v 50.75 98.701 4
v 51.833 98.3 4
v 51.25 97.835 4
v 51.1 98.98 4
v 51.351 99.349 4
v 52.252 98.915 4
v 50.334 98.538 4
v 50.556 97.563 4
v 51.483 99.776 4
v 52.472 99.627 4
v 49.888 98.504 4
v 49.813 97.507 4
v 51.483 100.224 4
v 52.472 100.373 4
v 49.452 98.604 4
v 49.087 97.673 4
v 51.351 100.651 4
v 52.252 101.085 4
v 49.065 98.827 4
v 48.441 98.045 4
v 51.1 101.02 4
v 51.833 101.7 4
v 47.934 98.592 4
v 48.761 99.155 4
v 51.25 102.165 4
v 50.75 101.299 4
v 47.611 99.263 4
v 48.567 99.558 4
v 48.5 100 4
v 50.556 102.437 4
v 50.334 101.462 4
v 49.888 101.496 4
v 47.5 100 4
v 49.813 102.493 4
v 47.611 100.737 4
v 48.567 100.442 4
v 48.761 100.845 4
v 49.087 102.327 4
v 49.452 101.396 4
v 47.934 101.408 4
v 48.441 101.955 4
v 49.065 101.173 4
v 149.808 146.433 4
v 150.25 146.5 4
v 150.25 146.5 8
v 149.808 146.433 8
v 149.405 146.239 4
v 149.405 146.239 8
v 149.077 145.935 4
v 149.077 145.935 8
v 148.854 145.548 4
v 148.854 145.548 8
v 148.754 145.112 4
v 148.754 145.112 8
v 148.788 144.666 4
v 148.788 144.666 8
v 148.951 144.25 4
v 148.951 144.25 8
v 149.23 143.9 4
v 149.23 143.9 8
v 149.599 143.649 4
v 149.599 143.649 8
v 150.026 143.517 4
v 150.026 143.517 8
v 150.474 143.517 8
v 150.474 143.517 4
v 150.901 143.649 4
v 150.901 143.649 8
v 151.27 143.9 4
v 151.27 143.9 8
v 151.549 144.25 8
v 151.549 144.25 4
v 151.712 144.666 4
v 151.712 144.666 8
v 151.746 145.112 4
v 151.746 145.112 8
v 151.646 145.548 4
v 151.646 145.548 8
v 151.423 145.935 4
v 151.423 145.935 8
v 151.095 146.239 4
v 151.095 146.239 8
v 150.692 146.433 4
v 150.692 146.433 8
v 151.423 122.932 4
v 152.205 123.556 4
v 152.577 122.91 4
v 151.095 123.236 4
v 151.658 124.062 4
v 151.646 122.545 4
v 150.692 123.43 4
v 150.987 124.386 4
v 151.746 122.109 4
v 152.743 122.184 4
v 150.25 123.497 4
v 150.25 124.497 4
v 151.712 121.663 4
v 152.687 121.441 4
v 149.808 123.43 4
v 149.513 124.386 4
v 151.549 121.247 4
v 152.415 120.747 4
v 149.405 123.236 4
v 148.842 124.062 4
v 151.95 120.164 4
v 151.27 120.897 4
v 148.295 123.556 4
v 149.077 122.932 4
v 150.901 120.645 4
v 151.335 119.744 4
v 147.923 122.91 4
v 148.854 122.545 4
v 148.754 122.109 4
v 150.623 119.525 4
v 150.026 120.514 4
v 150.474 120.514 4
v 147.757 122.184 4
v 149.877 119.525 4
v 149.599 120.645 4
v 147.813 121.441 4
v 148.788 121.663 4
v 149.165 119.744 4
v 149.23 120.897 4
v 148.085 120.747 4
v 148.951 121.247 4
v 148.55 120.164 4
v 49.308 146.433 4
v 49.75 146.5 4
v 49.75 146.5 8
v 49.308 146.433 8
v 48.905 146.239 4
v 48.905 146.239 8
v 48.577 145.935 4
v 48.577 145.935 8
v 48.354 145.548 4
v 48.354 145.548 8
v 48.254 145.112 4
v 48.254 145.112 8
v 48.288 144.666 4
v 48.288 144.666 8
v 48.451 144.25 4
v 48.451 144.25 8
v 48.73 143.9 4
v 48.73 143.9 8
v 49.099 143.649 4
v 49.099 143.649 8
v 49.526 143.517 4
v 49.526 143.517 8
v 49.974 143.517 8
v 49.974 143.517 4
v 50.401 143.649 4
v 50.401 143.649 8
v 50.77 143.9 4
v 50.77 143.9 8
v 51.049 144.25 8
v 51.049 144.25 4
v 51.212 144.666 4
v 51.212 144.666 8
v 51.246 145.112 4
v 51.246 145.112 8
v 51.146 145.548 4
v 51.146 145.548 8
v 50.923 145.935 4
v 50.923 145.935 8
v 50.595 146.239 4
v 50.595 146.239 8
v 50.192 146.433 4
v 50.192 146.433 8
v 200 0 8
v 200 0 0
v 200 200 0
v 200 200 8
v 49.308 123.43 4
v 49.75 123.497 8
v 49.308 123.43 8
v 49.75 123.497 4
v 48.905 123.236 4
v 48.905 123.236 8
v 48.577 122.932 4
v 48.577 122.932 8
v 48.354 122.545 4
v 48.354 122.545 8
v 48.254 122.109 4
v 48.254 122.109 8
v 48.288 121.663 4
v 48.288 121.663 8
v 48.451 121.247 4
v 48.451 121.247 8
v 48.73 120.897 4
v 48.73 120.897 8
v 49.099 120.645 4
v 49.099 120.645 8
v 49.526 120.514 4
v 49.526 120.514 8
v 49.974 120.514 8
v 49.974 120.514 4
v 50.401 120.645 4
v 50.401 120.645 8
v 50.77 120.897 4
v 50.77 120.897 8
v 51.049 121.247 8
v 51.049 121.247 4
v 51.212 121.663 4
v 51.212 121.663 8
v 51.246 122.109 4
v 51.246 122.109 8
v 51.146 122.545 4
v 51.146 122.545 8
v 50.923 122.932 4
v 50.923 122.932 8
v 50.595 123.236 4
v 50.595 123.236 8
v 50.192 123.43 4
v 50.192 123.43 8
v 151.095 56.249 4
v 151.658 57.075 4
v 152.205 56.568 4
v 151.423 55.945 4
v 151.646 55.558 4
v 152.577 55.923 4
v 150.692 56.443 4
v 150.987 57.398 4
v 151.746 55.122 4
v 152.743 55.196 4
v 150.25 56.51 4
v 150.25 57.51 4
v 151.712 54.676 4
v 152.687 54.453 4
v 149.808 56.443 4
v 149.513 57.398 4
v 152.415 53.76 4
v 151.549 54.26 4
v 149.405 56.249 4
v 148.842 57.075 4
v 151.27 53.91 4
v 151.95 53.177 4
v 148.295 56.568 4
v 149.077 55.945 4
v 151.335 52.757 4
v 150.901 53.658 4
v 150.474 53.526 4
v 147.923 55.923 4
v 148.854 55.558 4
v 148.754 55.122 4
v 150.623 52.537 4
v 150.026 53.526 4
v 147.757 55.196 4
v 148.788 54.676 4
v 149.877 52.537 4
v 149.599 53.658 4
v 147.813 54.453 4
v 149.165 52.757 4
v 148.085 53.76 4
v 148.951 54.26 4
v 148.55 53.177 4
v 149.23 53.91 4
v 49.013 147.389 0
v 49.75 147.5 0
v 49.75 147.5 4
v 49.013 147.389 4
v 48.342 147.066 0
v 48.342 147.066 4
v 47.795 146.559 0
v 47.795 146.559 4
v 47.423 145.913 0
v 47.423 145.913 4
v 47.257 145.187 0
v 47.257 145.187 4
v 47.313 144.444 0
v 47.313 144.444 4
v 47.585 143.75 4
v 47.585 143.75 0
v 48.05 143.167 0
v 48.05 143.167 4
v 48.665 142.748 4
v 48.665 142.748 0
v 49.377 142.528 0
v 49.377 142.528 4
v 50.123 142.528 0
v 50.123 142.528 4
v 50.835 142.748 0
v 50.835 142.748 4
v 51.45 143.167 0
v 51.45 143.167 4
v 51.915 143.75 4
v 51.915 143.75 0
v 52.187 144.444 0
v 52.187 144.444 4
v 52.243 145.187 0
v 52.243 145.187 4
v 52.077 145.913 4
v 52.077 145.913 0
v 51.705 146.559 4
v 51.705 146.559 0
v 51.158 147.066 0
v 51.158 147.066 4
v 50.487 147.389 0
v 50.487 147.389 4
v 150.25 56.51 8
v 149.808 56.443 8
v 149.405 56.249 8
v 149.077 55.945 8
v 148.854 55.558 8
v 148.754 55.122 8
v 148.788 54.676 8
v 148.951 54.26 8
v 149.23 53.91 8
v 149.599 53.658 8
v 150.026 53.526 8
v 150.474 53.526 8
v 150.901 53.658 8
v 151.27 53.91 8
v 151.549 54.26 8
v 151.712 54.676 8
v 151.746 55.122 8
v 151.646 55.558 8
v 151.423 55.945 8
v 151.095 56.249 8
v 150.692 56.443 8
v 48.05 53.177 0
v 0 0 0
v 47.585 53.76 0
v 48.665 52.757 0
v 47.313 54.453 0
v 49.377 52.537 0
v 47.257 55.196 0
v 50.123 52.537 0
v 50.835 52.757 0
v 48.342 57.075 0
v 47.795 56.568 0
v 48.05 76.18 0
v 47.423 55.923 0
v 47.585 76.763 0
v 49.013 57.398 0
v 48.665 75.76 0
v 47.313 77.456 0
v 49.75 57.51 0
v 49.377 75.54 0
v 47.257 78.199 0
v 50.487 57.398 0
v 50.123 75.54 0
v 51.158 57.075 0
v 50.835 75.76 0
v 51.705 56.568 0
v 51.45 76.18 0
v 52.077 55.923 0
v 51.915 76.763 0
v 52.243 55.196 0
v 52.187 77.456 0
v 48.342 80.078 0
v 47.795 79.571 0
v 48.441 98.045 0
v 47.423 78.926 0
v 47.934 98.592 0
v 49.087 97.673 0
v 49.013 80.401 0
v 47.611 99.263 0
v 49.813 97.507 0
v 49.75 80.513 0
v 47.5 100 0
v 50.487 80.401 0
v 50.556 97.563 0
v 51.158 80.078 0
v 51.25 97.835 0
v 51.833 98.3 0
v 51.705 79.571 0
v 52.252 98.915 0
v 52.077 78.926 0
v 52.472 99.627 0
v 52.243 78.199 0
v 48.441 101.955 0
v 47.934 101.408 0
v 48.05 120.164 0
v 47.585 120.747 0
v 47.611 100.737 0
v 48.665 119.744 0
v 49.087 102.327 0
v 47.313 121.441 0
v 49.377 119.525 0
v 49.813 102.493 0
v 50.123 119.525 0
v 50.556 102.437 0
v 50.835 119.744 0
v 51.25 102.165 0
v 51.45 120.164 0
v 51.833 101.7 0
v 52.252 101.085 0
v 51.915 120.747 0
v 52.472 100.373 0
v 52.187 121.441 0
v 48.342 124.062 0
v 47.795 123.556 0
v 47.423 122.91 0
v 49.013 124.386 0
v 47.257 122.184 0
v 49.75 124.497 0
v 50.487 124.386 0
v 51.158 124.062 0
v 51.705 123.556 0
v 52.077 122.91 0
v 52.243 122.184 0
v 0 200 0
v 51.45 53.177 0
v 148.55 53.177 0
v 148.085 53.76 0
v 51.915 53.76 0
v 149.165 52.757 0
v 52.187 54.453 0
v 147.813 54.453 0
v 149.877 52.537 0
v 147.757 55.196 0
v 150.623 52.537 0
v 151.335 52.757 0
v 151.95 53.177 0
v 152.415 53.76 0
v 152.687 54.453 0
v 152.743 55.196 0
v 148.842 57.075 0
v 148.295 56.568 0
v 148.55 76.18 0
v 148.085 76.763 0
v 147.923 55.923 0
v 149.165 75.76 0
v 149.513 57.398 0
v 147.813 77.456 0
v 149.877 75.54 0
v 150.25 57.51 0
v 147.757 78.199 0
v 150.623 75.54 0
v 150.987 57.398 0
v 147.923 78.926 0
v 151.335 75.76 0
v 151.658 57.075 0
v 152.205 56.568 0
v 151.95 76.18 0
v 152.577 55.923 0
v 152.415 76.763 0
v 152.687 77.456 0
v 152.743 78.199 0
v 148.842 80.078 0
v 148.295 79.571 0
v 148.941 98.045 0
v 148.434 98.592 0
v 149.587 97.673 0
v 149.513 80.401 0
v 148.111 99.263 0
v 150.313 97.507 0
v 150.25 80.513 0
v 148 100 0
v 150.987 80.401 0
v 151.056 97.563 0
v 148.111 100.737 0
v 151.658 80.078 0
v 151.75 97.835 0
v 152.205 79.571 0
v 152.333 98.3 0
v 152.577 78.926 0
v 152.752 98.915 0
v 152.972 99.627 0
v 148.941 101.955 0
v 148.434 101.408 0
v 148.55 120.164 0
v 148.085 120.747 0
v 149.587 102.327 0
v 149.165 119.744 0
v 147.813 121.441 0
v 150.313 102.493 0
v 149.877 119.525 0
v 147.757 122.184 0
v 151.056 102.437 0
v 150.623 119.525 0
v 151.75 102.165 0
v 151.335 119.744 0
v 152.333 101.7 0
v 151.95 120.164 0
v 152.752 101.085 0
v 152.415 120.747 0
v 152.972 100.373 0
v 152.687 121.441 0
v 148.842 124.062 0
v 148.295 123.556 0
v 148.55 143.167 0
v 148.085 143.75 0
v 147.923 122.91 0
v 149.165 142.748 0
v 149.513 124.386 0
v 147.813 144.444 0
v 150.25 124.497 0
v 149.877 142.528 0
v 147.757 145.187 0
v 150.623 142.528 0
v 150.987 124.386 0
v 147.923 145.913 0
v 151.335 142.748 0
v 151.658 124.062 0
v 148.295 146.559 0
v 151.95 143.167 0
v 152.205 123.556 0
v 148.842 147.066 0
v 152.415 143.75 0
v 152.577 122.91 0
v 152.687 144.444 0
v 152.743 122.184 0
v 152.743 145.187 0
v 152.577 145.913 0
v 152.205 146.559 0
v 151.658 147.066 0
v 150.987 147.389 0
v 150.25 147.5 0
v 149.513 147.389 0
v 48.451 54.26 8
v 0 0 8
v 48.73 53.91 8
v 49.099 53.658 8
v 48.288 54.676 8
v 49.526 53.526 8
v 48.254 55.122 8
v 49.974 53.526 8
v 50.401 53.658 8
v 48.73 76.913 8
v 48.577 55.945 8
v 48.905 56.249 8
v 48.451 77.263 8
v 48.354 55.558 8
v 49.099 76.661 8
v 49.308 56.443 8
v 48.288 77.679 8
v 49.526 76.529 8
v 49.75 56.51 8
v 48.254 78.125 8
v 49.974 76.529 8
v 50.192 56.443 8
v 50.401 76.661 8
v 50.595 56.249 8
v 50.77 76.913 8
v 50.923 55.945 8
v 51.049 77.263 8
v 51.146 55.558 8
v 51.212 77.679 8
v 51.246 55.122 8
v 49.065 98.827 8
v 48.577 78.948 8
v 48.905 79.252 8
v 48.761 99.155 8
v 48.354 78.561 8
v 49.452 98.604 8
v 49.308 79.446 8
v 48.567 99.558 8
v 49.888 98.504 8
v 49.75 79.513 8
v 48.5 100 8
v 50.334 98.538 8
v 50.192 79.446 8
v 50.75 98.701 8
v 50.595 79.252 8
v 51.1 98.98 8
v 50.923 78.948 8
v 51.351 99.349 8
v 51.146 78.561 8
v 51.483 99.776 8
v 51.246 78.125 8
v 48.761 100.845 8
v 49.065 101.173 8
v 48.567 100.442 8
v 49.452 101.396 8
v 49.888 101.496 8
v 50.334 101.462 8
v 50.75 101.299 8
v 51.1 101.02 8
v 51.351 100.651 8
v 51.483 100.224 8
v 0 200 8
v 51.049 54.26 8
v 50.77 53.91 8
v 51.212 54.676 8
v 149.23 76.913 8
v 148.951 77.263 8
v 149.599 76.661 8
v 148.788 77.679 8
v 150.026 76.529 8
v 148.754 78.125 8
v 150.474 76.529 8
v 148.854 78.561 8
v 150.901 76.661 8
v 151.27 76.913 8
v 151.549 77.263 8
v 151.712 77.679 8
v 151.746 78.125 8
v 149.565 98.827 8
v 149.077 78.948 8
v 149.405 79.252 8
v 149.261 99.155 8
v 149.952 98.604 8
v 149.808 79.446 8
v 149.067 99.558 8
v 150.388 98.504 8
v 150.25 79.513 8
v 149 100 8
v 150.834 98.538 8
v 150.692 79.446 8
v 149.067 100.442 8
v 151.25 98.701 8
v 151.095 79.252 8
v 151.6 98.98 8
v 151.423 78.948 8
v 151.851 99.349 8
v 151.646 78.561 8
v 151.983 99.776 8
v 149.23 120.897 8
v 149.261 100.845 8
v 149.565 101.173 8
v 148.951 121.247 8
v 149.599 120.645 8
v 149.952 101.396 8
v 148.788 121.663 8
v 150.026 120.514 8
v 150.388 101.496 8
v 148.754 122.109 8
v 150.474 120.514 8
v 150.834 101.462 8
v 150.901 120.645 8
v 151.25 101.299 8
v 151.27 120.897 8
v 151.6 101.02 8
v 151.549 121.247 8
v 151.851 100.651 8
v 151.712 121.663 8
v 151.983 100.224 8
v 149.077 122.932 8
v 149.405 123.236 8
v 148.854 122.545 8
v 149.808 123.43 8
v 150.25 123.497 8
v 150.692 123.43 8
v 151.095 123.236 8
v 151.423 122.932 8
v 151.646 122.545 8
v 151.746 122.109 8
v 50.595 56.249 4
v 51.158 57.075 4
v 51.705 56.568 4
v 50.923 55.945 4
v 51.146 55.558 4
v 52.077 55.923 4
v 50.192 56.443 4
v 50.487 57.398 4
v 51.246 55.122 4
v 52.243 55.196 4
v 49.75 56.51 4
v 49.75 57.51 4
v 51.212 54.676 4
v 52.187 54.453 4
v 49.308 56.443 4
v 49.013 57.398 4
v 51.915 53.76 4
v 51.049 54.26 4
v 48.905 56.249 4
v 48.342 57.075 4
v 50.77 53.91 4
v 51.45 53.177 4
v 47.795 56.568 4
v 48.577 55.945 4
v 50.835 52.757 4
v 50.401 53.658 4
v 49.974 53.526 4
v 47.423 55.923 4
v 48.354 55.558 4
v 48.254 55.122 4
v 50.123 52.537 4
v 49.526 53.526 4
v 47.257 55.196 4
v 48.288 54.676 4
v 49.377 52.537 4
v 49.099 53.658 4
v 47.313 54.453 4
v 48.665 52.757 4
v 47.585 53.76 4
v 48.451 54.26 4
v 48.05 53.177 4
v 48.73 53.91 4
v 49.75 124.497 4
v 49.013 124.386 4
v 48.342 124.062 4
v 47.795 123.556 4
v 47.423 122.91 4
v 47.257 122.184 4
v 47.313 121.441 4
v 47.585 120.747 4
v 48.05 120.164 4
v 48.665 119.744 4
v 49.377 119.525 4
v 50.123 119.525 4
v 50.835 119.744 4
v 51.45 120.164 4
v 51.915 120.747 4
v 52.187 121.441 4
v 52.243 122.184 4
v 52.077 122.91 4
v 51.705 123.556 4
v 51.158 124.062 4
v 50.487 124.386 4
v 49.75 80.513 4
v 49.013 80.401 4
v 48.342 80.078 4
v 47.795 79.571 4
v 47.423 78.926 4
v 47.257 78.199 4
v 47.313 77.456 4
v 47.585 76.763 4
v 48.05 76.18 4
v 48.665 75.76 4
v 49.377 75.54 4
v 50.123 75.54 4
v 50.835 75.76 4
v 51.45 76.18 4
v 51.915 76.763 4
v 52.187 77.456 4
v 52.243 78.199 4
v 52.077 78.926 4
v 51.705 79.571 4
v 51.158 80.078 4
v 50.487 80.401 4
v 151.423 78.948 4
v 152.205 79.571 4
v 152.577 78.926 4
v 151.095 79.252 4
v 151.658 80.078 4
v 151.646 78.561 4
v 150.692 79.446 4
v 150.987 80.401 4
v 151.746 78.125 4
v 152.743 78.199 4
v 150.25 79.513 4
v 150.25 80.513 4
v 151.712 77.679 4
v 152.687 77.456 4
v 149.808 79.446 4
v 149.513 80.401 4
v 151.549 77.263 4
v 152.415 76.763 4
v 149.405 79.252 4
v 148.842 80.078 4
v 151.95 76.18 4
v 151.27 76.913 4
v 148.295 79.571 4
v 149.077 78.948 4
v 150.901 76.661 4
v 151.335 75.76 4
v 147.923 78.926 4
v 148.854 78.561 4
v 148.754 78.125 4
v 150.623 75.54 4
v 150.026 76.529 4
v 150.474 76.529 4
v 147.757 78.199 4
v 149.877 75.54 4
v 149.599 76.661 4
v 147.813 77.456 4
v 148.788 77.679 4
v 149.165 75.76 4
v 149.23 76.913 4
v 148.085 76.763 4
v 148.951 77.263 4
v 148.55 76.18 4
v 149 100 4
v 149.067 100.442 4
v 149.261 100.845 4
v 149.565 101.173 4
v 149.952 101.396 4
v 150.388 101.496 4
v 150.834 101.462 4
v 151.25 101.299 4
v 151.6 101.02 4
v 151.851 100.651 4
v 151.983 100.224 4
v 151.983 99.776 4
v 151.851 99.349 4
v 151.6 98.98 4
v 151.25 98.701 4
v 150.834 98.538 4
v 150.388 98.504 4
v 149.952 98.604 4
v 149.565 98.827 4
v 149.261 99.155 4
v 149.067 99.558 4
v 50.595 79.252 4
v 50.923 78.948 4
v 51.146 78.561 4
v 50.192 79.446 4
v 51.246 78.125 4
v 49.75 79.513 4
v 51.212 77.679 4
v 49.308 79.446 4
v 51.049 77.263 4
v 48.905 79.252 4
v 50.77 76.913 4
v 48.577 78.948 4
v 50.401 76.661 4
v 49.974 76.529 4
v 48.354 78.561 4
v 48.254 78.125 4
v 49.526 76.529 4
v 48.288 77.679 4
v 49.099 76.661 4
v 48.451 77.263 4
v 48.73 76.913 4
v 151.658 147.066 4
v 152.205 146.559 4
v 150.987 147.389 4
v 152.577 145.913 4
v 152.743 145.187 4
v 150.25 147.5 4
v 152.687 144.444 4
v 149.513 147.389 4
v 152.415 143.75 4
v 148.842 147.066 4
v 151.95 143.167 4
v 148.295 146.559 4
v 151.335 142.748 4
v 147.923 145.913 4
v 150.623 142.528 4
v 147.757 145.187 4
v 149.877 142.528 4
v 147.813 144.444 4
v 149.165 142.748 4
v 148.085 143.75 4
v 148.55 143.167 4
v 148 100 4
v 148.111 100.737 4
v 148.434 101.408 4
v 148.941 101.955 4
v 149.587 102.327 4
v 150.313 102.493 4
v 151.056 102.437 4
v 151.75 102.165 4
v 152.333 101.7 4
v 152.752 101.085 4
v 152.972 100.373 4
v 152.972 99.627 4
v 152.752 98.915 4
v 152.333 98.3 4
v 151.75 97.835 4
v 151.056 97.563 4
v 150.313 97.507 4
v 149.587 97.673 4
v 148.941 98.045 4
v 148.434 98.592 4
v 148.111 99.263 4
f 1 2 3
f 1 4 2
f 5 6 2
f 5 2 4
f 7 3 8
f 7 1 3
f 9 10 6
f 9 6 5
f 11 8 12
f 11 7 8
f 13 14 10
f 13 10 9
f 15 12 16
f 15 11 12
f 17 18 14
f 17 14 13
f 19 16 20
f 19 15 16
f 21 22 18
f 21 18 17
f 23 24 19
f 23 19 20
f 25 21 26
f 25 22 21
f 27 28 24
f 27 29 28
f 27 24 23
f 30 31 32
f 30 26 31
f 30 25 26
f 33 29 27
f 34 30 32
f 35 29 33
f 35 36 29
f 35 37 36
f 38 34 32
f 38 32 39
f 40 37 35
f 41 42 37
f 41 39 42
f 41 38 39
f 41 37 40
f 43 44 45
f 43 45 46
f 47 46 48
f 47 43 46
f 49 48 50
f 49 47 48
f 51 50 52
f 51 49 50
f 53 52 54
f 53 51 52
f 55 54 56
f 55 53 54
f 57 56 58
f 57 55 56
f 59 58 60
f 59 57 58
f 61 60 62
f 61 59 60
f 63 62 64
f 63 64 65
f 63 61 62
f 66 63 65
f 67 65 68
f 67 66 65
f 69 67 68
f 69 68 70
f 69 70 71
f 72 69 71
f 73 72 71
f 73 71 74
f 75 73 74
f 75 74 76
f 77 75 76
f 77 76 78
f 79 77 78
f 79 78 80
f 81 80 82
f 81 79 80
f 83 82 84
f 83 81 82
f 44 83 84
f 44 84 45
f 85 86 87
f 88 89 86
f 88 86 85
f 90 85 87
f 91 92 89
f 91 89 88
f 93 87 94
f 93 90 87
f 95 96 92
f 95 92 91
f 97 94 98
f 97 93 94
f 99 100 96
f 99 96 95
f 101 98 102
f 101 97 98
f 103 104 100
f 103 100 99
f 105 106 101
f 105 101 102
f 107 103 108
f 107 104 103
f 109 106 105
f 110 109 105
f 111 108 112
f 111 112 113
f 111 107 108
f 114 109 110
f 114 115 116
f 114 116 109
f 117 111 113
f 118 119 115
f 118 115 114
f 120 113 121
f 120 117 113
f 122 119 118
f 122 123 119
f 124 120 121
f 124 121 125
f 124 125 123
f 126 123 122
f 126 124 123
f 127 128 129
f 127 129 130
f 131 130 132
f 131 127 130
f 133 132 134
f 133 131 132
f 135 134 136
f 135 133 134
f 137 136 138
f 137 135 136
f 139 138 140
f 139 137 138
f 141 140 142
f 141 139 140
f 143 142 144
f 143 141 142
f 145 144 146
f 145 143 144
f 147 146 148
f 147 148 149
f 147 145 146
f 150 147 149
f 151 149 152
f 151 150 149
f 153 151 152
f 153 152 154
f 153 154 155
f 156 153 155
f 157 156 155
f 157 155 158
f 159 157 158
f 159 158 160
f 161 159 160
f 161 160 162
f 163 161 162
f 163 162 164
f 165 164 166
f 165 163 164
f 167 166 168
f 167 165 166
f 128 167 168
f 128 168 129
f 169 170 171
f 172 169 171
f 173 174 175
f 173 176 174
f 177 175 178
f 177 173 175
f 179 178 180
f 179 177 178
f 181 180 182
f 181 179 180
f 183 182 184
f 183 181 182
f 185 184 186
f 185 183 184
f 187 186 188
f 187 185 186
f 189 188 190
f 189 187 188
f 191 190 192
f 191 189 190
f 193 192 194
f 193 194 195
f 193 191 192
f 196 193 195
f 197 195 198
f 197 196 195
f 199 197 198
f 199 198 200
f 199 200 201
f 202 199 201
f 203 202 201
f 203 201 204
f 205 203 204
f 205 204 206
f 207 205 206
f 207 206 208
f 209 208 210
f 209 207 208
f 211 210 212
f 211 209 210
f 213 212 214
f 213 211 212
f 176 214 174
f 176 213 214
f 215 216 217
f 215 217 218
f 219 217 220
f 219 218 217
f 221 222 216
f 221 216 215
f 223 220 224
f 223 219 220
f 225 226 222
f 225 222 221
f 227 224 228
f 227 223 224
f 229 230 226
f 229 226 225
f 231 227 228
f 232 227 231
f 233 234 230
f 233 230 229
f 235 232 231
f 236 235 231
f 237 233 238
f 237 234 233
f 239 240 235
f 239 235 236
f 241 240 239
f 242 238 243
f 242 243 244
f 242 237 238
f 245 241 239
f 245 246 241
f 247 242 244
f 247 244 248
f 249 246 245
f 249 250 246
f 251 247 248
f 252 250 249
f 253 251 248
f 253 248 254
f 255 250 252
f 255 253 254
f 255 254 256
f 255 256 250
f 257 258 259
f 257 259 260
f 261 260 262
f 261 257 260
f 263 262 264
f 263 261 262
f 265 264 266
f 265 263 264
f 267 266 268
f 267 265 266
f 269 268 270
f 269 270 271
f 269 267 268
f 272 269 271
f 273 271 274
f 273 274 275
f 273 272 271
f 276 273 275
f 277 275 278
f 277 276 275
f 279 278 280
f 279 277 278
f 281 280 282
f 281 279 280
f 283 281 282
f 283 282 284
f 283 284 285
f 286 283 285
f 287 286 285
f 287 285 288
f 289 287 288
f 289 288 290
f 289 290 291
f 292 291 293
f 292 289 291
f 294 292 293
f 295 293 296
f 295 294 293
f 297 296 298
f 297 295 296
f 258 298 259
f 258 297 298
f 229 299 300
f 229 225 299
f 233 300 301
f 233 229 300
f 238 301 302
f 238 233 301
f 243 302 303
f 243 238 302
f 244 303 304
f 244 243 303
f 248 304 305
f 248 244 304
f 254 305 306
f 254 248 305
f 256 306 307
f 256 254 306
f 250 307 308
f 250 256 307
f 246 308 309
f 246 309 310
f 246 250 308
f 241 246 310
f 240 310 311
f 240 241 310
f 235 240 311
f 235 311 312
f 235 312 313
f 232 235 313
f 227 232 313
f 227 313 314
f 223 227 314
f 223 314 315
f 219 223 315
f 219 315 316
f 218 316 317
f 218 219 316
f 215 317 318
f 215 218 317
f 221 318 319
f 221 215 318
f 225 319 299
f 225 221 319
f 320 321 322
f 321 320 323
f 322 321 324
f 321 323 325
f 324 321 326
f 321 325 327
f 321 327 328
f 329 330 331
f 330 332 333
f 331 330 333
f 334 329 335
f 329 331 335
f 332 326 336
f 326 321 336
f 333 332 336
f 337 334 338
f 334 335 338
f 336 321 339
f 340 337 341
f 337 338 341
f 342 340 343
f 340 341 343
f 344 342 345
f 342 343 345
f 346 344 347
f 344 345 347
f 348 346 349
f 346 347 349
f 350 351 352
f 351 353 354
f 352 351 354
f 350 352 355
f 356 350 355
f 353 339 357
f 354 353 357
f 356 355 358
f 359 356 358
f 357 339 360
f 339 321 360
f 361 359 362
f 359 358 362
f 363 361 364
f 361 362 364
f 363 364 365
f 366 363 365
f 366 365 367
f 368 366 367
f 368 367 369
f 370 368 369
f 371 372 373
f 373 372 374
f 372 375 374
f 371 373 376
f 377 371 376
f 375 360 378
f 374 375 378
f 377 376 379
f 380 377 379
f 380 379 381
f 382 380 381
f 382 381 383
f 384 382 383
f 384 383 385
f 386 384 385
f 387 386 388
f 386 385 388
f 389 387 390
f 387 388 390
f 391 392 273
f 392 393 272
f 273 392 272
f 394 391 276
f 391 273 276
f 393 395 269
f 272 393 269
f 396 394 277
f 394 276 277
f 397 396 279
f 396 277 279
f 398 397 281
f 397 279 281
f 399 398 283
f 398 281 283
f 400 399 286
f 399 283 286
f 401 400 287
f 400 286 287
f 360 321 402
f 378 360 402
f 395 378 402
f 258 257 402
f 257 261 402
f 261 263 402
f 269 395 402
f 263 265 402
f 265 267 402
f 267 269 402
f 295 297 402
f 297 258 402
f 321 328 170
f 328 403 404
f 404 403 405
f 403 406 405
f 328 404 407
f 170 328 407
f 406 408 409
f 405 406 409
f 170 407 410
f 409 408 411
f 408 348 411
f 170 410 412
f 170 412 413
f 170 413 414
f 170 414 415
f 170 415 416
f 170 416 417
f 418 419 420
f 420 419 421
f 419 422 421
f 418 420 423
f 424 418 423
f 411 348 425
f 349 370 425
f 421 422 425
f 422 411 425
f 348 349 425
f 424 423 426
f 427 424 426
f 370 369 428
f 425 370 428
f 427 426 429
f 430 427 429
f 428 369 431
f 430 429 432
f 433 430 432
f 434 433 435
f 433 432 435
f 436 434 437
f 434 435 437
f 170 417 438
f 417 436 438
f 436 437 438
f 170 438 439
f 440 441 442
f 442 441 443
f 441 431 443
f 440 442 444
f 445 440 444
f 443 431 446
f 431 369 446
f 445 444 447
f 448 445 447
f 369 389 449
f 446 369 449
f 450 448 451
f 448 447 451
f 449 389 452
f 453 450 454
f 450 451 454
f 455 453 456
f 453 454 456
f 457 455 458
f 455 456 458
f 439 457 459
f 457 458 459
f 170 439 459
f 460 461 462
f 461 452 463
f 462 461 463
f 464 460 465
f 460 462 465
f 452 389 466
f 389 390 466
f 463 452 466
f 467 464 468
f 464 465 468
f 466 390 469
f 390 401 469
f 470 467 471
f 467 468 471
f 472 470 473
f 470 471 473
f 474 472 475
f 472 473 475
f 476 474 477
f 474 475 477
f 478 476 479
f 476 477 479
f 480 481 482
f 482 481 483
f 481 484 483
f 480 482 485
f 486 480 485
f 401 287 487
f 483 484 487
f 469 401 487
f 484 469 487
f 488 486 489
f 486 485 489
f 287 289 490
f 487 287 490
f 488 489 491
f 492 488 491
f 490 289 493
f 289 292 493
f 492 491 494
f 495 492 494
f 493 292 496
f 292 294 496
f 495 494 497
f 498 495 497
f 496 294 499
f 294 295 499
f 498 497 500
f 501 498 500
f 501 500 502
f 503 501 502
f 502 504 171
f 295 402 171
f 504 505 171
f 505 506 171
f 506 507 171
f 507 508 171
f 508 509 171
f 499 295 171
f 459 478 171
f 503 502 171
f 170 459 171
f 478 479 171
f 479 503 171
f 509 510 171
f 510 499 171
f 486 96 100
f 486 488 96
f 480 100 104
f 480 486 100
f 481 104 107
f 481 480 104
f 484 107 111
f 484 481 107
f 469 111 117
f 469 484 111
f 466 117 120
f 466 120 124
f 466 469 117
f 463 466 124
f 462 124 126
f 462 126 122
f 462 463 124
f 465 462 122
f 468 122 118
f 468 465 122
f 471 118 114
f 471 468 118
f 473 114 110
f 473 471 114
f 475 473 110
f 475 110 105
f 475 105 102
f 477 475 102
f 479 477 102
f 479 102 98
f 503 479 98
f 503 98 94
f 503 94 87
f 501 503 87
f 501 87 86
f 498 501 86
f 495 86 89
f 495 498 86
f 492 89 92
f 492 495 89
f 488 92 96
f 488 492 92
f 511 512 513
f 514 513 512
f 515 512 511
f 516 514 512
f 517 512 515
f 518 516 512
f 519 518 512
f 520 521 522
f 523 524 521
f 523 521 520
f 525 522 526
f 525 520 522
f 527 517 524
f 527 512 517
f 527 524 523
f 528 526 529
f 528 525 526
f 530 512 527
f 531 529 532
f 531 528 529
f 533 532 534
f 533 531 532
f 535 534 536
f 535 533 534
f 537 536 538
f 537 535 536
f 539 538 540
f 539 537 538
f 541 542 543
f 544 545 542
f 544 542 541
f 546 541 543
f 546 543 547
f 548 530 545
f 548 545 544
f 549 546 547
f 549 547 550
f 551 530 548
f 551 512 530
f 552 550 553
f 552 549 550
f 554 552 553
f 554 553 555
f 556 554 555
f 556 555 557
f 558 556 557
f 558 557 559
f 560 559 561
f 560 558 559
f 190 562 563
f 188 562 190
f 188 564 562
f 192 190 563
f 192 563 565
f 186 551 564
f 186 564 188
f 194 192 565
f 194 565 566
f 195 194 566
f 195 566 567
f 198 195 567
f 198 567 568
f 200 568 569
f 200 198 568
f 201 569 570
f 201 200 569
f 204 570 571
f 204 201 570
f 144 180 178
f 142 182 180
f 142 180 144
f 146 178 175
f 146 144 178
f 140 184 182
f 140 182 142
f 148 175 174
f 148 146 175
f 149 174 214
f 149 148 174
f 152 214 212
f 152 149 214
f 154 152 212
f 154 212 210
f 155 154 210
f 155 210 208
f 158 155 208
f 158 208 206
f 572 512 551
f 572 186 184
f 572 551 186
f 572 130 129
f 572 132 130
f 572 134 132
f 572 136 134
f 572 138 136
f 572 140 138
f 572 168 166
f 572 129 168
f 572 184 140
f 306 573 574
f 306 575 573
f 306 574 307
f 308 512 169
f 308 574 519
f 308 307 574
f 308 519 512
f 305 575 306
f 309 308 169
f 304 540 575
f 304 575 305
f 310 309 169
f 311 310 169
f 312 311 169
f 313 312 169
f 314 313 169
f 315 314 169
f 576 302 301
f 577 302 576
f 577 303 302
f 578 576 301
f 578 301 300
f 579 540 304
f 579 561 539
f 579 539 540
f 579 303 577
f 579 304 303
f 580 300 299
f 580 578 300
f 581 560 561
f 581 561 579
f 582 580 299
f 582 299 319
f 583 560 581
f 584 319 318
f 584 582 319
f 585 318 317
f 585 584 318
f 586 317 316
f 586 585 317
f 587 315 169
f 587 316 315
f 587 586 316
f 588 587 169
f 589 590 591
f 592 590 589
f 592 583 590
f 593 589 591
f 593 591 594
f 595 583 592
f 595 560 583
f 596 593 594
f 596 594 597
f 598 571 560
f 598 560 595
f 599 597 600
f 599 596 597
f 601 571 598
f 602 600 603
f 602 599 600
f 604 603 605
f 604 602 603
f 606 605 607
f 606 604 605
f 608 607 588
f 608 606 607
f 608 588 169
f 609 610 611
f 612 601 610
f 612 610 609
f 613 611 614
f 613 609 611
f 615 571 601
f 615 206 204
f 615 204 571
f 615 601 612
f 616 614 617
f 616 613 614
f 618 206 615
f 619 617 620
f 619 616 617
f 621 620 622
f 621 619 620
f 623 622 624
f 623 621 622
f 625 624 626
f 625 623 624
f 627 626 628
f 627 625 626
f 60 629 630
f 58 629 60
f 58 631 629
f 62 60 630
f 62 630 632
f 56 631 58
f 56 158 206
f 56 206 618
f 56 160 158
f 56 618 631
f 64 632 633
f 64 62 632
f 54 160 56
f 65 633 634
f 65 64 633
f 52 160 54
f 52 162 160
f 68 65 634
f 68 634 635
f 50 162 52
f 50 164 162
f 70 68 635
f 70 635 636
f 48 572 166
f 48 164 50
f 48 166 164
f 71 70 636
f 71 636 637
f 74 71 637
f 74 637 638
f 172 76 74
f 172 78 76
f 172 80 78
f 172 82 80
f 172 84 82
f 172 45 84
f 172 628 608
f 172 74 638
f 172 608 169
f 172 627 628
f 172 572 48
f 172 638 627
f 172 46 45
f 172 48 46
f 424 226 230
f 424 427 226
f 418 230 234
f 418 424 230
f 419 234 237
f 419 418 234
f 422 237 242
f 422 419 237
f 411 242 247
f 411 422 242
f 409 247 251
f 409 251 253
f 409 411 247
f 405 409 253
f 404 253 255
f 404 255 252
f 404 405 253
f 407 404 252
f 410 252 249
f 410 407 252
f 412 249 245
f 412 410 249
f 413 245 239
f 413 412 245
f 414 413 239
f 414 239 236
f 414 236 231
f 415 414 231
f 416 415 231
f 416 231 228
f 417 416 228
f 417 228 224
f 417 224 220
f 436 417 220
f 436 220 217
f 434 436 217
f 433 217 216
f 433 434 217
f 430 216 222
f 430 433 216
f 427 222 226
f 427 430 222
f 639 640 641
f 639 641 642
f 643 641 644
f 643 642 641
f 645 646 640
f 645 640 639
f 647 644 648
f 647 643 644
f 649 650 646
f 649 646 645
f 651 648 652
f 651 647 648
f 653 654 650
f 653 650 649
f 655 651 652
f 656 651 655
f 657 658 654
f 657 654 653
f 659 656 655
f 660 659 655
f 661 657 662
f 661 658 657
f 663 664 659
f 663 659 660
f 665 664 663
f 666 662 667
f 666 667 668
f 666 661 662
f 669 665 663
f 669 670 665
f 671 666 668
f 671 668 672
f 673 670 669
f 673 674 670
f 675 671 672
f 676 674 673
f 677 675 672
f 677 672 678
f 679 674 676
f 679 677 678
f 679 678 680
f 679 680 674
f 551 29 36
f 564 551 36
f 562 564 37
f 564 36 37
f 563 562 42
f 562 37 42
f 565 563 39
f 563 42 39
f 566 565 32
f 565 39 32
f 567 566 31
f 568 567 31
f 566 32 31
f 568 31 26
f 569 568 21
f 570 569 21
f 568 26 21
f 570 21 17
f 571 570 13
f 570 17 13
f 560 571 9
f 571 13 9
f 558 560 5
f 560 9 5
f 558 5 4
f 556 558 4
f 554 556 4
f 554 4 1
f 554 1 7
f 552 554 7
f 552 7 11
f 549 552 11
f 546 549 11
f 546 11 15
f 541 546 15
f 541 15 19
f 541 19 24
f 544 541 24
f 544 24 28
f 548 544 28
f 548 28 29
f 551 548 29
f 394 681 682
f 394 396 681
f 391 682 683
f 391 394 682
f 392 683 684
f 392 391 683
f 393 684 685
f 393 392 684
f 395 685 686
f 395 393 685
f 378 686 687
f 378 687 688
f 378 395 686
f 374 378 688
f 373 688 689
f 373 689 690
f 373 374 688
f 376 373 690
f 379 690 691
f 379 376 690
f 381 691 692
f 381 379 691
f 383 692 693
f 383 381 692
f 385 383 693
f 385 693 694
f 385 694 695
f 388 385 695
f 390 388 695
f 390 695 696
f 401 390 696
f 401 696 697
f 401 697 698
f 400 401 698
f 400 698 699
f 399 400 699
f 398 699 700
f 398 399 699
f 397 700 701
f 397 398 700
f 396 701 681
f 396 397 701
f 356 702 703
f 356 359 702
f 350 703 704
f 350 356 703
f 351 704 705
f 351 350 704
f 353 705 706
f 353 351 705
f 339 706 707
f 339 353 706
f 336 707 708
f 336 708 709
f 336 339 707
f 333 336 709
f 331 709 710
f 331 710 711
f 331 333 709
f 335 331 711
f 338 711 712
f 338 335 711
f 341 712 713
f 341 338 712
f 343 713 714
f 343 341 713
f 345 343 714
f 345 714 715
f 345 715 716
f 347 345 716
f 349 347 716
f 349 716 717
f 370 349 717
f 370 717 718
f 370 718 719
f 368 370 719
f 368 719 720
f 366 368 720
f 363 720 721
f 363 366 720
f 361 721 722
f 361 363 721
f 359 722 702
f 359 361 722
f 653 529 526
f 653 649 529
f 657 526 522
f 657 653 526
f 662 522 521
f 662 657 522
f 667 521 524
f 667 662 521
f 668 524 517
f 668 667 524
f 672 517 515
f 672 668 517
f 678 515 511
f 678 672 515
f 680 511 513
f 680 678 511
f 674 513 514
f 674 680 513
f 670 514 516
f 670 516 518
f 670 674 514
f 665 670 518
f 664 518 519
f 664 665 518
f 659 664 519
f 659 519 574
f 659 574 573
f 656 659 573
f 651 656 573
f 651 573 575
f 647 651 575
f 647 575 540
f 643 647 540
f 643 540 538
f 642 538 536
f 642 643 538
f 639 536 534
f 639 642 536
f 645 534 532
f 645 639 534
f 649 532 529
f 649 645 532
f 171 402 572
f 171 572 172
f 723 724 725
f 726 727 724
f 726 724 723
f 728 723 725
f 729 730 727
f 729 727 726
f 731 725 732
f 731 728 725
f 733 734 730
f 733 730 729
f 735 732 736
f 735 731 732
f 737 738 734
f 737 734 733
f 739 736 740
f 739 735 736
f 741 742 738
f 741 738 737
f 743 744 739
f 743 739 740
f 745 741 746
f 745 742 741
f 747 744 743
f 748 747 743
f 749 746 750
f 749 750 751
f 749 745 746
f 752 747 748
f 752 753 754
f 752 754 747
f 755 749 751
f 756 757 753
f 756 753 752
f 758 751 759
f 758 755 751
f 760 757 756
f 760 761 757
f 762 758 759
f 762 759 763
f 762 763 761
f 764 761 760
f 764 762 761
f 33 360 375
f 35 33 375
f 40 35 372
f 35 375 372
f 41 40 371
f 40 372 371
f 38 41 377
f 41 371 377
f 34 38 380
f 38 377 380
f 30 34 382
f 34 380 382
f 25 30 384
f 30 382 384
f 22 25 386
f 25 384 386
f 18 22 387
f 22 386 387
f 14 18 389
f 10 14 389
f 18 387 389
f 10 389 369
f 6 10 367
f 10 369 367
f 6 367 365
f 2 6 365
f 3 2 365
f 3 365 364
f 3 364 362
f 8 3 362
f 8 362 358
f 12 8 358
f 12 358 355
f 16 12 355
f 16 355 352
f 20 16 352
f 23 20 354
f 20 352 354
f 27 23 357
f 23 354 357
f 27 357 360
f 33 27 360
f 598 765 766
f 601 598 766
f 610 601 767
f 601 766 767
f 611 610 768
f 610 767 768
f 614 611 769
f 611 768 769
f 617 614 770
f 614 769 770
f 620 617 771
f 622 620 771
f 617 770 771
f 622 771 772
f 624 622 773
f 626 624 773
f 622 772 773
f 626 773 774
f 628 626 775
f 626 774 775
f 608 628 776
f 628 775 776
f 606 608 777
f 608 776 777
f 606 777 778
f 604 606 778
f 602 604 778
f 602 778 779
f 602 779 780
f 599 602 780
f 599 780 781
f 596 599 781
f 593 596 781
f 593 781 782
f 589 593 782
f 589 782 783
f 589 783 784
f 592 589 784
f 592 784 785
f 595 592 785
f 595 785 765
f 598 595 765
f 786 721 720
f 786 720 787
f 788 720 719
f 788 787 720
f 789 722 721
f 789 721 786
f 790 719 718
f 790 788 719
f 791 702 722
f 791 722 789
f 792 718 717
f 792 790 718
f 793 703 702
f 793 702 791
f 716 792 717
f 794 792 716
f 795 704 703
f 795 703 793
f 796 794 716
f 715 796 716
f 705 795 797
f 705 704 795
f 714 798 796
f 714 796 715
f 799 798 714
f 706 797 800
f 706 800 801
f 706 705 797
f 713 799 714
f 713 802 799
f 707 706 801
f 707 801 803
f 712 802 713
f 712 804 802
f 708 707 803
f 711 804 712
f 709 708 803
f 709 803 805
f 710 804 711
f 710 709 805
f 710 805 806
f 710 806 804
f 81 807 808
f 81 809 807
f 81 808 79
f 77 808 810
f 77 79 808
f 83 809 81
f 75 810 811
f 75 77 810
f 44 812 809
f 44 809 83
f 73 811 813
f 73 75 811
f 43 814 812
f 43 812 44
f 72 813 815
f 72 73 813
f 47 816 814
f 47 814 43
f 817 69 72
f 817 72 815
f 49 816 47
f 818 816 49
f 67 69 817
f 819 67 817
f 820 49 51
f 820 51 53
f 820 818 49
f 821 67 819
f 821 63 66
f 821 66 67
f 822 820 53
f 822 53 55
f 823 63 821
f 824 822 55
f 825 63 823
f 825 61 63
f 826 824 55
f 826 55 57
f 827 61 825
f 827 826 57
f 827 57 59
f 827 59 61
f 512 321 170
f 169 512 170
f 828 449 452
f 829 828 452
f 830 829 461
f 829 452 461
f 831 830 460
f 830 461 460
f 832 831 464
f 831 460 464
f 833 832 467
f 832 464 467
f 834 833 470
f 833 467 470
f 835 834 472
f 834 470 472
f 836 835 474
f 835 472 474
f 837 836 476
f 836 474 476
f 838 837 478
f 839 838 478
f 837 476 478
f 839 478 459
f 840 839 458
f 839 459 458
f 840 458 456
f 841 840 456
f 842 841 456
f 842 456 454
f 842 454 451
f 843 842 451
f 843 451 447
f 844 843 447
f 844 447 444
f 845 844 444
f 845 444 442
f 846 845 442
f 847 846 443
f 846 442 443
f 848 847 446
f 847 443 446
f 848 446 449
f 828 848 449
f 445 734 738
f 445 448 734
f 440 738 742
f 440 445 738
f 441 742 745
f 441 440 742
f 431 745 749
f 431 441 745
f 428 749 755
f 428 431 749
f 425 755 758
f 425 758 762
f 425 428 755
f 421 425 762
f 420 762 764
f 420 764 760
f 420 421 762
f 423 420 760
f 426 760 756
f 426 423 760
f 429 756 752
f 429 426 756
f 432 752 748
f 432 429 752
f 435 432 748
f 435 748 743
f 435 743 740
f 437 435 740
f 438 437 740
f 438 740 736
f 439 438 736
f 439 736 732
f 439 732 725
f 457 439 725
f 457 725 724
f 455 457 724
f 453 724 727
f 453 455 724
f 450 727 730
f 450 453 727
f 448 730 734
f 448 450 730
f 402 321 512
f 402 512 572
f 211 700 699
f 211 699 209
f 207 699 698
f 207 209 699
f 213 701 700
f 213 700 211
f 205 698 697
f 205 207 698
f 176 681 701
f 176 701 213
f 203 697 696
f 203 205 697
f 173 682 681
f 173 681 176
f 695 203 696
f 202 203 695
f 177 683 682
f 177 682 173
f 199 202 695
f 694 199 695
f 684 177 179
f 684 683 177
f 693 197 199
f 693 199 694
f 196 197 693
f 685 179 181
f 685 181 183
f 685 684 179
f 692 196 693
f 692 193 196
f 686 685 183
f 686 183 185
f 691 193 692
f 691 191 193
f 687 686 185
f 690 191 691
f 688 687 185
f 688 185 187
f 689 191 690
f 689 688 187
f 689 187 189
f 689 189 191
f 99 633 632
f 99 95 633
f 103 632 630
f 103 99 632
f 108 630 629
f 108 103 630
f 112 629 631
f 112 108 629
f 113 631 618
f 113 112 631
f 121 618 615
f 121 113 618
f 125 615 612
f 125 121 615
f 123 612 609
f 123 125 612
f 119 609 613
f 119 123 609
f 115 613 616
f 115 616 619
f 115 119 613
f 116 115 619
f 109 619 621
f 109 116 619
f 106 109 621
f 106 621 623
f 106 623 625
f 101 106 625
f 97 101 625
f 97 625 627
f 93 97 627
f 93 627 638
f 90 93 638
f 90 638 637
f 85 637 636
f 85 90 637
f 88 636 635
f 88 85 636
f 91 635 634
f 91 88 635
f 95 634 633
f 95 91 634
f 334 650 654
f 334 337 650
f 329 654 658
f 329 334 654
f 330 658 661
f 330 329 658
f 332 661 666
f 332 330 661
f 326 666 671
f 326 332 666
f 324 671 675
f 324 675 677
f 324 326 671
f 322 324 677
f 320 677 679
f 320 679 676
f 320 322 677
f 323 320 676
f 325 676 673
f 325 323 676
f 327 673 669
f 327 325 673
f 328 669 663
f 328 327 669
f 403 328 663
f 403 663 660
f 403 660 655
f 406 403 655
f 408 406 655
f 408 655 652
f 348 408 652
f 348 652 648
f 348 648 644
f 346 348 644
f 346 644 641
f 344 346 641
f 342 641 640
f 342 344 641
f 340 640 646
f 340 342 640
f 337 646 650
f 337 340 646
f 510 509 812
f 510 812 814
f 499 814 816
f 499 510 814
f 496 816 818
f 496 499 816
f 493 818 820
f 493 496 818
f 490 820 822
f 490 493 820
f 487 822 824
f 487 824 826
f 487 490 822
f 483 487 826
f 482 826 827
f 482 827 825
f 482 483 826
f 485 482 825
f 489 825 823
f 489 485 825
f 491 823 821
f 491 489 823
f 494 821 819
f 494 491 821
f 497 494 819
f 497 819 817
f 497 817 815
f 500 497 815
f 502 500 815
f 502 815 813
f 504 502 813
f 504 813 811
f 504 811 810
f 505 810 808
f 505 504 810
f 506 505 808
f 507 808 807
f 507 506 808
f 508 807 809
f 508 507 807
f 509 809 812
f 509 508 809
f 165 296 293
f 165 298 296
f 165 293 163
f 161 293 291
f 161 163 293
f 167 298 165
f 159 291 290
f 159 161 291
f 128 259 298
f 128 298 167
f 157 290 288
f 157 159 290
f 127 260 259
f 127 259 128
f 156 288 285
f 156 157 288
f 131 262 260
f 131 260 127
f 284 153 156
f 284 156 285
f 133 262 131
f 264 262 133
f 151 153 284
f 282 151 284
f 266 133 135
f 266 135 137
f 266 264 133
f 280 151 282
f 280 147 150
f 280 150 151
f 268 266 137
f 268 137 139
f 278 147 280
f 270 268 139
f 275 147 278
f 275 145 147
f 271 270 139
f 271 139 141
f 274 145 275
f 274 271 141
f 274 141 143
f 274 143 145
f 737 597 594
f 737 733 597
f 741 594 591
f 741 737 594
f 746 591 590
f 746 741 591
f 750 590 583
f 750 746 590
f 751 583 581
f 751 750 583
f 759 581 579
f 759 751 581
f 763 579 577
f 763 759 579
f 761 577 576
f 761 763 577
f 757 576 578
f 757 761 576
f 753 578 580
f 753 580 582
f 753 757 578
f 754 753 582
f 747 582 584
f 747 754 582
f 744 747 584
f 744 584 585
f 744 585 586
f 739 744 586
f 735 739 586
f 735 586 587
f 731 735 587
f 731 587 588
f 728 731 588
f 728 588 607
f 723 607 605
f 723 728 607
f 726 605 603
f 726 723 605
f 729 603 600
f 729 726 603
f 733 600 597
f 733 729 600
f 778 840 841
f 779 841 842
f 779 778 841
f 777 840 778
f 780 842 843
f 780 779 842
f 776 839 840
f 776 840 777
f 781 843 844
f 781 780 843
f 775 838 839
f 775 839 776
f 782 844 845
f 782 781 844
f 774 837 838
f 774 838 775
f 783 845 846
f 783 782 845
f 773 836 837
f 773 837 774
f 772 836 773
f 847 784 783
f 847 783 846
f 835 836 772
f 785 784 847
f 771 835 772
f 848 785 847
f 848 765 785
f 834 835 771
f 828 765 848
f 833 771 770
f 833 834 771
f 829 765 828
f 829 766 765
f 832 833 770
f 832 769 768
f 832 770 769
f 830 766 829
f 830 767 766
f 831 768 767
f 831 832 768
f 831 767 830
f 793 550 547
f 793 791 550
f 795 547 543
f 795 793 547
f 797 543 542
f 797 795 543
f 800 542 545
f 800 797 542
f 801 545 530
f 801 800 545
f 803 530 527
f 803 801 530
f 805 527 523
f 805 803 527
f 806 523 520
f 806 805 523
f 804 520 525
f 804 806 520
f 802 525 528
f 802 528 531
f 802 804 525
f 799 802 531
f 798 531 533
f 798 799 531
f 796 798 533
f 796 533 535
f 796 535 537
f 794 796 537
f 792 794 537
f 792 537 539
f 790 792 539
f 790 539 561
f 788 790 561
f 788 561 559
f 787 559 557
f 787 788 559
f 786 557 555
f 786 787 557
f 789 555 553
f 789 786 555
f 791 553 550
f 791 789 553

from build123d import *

# Parameters (mm, degrees)
SKETCH1_W                               = 200
SKETCH1_H                               = 200
BOSS_EXTRUDE1_DEPTH                     = 8
CBORE_FOR_M2_PAN_HEAD_SCREW1_AT_2_COUNT = 2
CBORE_FOR_M2_PAN_HEAD_SCREW1_AT_2_PITCH = 89.990465529
CBORE_FOR_M2_PAN_HEAD_SCREW1_AT_3_COUNT = 2
CBORE_FOR_M2_PAN_HEAD_SCREW1_AT_3_PITCH = 89.990465529
CBORE_FOR_M2_PAN_HEAD_SCREW1_AT_4_COUNT = 2
CBORE_FOR_M2_PAN_HEAD_SCREW1_AT_4_PITCH = 66.987356945
CBORE_FOR_M2_PAN_HEAD_SCREW1_AT_5_COUNT = 2
CBORE_FOR_M2_PAN_HEAD_SCREW1_AT_5_PITCH = 23.002979742
SKETCH7_R                               = 2.5
CUT_EXTRUDE1_DEPTH                      = 4
SKETCH9_R                               = 1.5
CUT_EXTRUDE2_DEPTH                      = 10
LPATTERN1_COUNT                         = 2
LPATTERN1_PITCH                         = 100.5


with BuildPart() as part:
    # Sketch1 → Boss-Extrude1 (new body)
    with BuildSketch(Plane.XY):
        with Locations((100, 100)):
            Rectangle(SKETCH1_W, SKETCH1_H)
    extrude(amount=BOSS_EXTRUDE1_DEPTH)

    # Sketch6 → CBORE for M2 Pan Head Screw1 (revolve, cut)
    with BuildSketch(Plane(origin=(49.75, 55.009534471, 0), x_dir=(0, 1, 0), z_dir=(1, 0, 0))):
        Polygon((0, 0), (0, 8.901290929), (1.5, 8), (1.5, 4), (2.5, 4), (2.5, 0), align=None)
    cbore_for_m2_pan_head_screw1 = revolve(axis=Axis((49.75, 55.009534471, -6.35), (0, 0, 1)), mode=Mode.SUBTRACT)

    # CBORE for M2 Pan Head Screw1 at 2: CBORE for M2 Pan Head Screw1 ×2
    with Locations(*[(0, i * CBORE_FOR_M2_PAN_HEAD_SCREW1_AT_2_PITCH, 0) for i in range(1, CBORE_FOR_M2_PAN_HEAD_SCREW1_AT_2_COUNT)]):
        add(cbore_for_m2_pan_head_screw1, mode=Mode.SUBTRACT)

    # CBORE for M2 Pan Head Screw1 at 3: CBORE for M2 Pan Head Screw1 ×2
    with Locations(*[(0, i * CBORE_FOR_M2_PAN_HEAD_SCREW1_AT_3_PITCH, 0) for i in range(1, CBORE_FOR_M2_PAN_HEAD_SCREW1_AT_3_COUNT)]):
        add(cbore_for_m2_pan_head_screw1, mode=Mode.SUBTRACT)

    # CBORE for M2 Pan Head Screw1 at 4: CBORE for M2 Pan Head Screw1 ×2
    with Locations(*[(0, i * CBORE_FOR_M2_PAN_HEAD_SCREW1_AT_4_PITCH, 0) for i in range(1, CBORE_FOR_M2_PAN_HEAD_SCREW1_AT_4_COUNT)]):
        add(cbore_for_m2_pan_head_screw1, mode=Mode.SUBTRACT)

    # CBORE for M2 Pan Head Screw1 at 5: CBORE for M2 Pan Head Screw1 ×2
    with Locations(*[(0, i * CBORE_FOR_M2_PAN_HEAD_SCREW1_AT_5_PITCH, 0) for i in range(1, CBORE_FOR_M2_PAN_HEAD_SCREW1_AT_5_COUNT)]):
        add(cbore_for_m2_pan_head_screw1, mode=Mode.SUBTRACT)

    # Sketch7 → Cut-Extrude1 (cut)
    with BuildSketch(Plane(origin=(0, 0, 0), x_dir=(-1, 0, 0), z_dir=(0, 0, -1))):
        with Locations((-50, 100)):
            Circle(SKETCH7_R)
    cut_extrude1 = extrude(amount=-CUT_EXTRUDE1_DEPTH, mode=Mode.SUBTRACT)

    # Sketch9 → Cut-Extrude2 (cut)
    with BuildSketch(Plane(origin=(0, 0, 4), x_dir=(-1, 0, 0), z_dir=(0, 0, -1))):
        with Locations((-50, 100)):
            Circle(SKETCH9_R)
    cut_extrude2 = extrude(amount=-CUT_EXTRUDE2_DEPTH, mode=Mode.SUBTRACT)

    # LPattern1: CBORE for M2 Pan Head Screw1, Cut-Extrude1, Cut-Extrude2 ×2
    with Locations(*[(i * LPATTERN1_PITCH, 0, 0) for i in range(1, LPATTERN1_COUNT)]):
        add(cbore_for_m2_pan_head_screw1, mode=Mode.SUBTRACT)
        add(cut_extrude1, mode=Mode.SUBTRACT)
        add(cut_extrude2, mode=Mode.SUBTRACT)

    # LPattern1 copy 1 sketch → LPattern1 copy 1 (revolve, cut)
    with BuildSketch(Plane(origin=(150.25, 145, 0), x_dir=(0, 1, 0), z_dir=(1, 0, 0))):
        Polygon((0, 0), (0, 8.901290929), (1.5, 8), (1.5, 4), (2.5, 4), (2.5, 0), align=None)
    revolve(axis=Axis((150.25, 145, -6.35), (0, 0, 1)), mode=Mode.SUBTRACT)

    # LPattern1 copy 2 sketch → LPattern1 copy 2 (revolve, cut)
    with BuildSketch(Plane(origin=(150.25, 145, 0), x_dir=(0, 1, 0), z_dir=(1, 0, 0))):
        Polygon((0, 0), (0, 8.901290929), (1.5, 8), (1.5, 4), (2.5, 4), (2.5, 0), align=None)
    revolve(axis=Axis((150.25, 145, -6.35), (0, 0, 1)), mode=Mode.SUBTRACT)

    # LPattern1 copy 3 sketch → LPattern1 copy 3 (revolve, cut)
    with BuildSketch(Plane(origin=(150.25, 121.996891416, 0), x_dir=(0, 1, 0), z_dir=(1, 0, 0))):
        Polygon((0, 0), (0, 8.901290929), (1.5, 8), (1.5, 4), (2.5, 4), (2.5, 0), align=None)
    revolve(axis=Axis((150.25, 121.996891416, -6.35), (0, 0, 1)), mode=Mode.SUBTRACT)

    # LPattern1 copy 4 sketch → LPattern1 copy 4 (revolve, cut)
    with BuildSketch(Plane(origin=(150.25, 78.012514213, 0), x_dir=(0, 1, 0), z_dir=(1, 0, 0))):
        Polygon((0, 0), (0, 8.901290929), (1.5, 8), (1.5, 4), (2.5, 4), (2.5, 0), align=None)
    revolve(axis=Axis((150.25, 78.012514213, -6.35), (0, 0, 1)), mode=Mode.SUBTRACT)


solid = part.part
